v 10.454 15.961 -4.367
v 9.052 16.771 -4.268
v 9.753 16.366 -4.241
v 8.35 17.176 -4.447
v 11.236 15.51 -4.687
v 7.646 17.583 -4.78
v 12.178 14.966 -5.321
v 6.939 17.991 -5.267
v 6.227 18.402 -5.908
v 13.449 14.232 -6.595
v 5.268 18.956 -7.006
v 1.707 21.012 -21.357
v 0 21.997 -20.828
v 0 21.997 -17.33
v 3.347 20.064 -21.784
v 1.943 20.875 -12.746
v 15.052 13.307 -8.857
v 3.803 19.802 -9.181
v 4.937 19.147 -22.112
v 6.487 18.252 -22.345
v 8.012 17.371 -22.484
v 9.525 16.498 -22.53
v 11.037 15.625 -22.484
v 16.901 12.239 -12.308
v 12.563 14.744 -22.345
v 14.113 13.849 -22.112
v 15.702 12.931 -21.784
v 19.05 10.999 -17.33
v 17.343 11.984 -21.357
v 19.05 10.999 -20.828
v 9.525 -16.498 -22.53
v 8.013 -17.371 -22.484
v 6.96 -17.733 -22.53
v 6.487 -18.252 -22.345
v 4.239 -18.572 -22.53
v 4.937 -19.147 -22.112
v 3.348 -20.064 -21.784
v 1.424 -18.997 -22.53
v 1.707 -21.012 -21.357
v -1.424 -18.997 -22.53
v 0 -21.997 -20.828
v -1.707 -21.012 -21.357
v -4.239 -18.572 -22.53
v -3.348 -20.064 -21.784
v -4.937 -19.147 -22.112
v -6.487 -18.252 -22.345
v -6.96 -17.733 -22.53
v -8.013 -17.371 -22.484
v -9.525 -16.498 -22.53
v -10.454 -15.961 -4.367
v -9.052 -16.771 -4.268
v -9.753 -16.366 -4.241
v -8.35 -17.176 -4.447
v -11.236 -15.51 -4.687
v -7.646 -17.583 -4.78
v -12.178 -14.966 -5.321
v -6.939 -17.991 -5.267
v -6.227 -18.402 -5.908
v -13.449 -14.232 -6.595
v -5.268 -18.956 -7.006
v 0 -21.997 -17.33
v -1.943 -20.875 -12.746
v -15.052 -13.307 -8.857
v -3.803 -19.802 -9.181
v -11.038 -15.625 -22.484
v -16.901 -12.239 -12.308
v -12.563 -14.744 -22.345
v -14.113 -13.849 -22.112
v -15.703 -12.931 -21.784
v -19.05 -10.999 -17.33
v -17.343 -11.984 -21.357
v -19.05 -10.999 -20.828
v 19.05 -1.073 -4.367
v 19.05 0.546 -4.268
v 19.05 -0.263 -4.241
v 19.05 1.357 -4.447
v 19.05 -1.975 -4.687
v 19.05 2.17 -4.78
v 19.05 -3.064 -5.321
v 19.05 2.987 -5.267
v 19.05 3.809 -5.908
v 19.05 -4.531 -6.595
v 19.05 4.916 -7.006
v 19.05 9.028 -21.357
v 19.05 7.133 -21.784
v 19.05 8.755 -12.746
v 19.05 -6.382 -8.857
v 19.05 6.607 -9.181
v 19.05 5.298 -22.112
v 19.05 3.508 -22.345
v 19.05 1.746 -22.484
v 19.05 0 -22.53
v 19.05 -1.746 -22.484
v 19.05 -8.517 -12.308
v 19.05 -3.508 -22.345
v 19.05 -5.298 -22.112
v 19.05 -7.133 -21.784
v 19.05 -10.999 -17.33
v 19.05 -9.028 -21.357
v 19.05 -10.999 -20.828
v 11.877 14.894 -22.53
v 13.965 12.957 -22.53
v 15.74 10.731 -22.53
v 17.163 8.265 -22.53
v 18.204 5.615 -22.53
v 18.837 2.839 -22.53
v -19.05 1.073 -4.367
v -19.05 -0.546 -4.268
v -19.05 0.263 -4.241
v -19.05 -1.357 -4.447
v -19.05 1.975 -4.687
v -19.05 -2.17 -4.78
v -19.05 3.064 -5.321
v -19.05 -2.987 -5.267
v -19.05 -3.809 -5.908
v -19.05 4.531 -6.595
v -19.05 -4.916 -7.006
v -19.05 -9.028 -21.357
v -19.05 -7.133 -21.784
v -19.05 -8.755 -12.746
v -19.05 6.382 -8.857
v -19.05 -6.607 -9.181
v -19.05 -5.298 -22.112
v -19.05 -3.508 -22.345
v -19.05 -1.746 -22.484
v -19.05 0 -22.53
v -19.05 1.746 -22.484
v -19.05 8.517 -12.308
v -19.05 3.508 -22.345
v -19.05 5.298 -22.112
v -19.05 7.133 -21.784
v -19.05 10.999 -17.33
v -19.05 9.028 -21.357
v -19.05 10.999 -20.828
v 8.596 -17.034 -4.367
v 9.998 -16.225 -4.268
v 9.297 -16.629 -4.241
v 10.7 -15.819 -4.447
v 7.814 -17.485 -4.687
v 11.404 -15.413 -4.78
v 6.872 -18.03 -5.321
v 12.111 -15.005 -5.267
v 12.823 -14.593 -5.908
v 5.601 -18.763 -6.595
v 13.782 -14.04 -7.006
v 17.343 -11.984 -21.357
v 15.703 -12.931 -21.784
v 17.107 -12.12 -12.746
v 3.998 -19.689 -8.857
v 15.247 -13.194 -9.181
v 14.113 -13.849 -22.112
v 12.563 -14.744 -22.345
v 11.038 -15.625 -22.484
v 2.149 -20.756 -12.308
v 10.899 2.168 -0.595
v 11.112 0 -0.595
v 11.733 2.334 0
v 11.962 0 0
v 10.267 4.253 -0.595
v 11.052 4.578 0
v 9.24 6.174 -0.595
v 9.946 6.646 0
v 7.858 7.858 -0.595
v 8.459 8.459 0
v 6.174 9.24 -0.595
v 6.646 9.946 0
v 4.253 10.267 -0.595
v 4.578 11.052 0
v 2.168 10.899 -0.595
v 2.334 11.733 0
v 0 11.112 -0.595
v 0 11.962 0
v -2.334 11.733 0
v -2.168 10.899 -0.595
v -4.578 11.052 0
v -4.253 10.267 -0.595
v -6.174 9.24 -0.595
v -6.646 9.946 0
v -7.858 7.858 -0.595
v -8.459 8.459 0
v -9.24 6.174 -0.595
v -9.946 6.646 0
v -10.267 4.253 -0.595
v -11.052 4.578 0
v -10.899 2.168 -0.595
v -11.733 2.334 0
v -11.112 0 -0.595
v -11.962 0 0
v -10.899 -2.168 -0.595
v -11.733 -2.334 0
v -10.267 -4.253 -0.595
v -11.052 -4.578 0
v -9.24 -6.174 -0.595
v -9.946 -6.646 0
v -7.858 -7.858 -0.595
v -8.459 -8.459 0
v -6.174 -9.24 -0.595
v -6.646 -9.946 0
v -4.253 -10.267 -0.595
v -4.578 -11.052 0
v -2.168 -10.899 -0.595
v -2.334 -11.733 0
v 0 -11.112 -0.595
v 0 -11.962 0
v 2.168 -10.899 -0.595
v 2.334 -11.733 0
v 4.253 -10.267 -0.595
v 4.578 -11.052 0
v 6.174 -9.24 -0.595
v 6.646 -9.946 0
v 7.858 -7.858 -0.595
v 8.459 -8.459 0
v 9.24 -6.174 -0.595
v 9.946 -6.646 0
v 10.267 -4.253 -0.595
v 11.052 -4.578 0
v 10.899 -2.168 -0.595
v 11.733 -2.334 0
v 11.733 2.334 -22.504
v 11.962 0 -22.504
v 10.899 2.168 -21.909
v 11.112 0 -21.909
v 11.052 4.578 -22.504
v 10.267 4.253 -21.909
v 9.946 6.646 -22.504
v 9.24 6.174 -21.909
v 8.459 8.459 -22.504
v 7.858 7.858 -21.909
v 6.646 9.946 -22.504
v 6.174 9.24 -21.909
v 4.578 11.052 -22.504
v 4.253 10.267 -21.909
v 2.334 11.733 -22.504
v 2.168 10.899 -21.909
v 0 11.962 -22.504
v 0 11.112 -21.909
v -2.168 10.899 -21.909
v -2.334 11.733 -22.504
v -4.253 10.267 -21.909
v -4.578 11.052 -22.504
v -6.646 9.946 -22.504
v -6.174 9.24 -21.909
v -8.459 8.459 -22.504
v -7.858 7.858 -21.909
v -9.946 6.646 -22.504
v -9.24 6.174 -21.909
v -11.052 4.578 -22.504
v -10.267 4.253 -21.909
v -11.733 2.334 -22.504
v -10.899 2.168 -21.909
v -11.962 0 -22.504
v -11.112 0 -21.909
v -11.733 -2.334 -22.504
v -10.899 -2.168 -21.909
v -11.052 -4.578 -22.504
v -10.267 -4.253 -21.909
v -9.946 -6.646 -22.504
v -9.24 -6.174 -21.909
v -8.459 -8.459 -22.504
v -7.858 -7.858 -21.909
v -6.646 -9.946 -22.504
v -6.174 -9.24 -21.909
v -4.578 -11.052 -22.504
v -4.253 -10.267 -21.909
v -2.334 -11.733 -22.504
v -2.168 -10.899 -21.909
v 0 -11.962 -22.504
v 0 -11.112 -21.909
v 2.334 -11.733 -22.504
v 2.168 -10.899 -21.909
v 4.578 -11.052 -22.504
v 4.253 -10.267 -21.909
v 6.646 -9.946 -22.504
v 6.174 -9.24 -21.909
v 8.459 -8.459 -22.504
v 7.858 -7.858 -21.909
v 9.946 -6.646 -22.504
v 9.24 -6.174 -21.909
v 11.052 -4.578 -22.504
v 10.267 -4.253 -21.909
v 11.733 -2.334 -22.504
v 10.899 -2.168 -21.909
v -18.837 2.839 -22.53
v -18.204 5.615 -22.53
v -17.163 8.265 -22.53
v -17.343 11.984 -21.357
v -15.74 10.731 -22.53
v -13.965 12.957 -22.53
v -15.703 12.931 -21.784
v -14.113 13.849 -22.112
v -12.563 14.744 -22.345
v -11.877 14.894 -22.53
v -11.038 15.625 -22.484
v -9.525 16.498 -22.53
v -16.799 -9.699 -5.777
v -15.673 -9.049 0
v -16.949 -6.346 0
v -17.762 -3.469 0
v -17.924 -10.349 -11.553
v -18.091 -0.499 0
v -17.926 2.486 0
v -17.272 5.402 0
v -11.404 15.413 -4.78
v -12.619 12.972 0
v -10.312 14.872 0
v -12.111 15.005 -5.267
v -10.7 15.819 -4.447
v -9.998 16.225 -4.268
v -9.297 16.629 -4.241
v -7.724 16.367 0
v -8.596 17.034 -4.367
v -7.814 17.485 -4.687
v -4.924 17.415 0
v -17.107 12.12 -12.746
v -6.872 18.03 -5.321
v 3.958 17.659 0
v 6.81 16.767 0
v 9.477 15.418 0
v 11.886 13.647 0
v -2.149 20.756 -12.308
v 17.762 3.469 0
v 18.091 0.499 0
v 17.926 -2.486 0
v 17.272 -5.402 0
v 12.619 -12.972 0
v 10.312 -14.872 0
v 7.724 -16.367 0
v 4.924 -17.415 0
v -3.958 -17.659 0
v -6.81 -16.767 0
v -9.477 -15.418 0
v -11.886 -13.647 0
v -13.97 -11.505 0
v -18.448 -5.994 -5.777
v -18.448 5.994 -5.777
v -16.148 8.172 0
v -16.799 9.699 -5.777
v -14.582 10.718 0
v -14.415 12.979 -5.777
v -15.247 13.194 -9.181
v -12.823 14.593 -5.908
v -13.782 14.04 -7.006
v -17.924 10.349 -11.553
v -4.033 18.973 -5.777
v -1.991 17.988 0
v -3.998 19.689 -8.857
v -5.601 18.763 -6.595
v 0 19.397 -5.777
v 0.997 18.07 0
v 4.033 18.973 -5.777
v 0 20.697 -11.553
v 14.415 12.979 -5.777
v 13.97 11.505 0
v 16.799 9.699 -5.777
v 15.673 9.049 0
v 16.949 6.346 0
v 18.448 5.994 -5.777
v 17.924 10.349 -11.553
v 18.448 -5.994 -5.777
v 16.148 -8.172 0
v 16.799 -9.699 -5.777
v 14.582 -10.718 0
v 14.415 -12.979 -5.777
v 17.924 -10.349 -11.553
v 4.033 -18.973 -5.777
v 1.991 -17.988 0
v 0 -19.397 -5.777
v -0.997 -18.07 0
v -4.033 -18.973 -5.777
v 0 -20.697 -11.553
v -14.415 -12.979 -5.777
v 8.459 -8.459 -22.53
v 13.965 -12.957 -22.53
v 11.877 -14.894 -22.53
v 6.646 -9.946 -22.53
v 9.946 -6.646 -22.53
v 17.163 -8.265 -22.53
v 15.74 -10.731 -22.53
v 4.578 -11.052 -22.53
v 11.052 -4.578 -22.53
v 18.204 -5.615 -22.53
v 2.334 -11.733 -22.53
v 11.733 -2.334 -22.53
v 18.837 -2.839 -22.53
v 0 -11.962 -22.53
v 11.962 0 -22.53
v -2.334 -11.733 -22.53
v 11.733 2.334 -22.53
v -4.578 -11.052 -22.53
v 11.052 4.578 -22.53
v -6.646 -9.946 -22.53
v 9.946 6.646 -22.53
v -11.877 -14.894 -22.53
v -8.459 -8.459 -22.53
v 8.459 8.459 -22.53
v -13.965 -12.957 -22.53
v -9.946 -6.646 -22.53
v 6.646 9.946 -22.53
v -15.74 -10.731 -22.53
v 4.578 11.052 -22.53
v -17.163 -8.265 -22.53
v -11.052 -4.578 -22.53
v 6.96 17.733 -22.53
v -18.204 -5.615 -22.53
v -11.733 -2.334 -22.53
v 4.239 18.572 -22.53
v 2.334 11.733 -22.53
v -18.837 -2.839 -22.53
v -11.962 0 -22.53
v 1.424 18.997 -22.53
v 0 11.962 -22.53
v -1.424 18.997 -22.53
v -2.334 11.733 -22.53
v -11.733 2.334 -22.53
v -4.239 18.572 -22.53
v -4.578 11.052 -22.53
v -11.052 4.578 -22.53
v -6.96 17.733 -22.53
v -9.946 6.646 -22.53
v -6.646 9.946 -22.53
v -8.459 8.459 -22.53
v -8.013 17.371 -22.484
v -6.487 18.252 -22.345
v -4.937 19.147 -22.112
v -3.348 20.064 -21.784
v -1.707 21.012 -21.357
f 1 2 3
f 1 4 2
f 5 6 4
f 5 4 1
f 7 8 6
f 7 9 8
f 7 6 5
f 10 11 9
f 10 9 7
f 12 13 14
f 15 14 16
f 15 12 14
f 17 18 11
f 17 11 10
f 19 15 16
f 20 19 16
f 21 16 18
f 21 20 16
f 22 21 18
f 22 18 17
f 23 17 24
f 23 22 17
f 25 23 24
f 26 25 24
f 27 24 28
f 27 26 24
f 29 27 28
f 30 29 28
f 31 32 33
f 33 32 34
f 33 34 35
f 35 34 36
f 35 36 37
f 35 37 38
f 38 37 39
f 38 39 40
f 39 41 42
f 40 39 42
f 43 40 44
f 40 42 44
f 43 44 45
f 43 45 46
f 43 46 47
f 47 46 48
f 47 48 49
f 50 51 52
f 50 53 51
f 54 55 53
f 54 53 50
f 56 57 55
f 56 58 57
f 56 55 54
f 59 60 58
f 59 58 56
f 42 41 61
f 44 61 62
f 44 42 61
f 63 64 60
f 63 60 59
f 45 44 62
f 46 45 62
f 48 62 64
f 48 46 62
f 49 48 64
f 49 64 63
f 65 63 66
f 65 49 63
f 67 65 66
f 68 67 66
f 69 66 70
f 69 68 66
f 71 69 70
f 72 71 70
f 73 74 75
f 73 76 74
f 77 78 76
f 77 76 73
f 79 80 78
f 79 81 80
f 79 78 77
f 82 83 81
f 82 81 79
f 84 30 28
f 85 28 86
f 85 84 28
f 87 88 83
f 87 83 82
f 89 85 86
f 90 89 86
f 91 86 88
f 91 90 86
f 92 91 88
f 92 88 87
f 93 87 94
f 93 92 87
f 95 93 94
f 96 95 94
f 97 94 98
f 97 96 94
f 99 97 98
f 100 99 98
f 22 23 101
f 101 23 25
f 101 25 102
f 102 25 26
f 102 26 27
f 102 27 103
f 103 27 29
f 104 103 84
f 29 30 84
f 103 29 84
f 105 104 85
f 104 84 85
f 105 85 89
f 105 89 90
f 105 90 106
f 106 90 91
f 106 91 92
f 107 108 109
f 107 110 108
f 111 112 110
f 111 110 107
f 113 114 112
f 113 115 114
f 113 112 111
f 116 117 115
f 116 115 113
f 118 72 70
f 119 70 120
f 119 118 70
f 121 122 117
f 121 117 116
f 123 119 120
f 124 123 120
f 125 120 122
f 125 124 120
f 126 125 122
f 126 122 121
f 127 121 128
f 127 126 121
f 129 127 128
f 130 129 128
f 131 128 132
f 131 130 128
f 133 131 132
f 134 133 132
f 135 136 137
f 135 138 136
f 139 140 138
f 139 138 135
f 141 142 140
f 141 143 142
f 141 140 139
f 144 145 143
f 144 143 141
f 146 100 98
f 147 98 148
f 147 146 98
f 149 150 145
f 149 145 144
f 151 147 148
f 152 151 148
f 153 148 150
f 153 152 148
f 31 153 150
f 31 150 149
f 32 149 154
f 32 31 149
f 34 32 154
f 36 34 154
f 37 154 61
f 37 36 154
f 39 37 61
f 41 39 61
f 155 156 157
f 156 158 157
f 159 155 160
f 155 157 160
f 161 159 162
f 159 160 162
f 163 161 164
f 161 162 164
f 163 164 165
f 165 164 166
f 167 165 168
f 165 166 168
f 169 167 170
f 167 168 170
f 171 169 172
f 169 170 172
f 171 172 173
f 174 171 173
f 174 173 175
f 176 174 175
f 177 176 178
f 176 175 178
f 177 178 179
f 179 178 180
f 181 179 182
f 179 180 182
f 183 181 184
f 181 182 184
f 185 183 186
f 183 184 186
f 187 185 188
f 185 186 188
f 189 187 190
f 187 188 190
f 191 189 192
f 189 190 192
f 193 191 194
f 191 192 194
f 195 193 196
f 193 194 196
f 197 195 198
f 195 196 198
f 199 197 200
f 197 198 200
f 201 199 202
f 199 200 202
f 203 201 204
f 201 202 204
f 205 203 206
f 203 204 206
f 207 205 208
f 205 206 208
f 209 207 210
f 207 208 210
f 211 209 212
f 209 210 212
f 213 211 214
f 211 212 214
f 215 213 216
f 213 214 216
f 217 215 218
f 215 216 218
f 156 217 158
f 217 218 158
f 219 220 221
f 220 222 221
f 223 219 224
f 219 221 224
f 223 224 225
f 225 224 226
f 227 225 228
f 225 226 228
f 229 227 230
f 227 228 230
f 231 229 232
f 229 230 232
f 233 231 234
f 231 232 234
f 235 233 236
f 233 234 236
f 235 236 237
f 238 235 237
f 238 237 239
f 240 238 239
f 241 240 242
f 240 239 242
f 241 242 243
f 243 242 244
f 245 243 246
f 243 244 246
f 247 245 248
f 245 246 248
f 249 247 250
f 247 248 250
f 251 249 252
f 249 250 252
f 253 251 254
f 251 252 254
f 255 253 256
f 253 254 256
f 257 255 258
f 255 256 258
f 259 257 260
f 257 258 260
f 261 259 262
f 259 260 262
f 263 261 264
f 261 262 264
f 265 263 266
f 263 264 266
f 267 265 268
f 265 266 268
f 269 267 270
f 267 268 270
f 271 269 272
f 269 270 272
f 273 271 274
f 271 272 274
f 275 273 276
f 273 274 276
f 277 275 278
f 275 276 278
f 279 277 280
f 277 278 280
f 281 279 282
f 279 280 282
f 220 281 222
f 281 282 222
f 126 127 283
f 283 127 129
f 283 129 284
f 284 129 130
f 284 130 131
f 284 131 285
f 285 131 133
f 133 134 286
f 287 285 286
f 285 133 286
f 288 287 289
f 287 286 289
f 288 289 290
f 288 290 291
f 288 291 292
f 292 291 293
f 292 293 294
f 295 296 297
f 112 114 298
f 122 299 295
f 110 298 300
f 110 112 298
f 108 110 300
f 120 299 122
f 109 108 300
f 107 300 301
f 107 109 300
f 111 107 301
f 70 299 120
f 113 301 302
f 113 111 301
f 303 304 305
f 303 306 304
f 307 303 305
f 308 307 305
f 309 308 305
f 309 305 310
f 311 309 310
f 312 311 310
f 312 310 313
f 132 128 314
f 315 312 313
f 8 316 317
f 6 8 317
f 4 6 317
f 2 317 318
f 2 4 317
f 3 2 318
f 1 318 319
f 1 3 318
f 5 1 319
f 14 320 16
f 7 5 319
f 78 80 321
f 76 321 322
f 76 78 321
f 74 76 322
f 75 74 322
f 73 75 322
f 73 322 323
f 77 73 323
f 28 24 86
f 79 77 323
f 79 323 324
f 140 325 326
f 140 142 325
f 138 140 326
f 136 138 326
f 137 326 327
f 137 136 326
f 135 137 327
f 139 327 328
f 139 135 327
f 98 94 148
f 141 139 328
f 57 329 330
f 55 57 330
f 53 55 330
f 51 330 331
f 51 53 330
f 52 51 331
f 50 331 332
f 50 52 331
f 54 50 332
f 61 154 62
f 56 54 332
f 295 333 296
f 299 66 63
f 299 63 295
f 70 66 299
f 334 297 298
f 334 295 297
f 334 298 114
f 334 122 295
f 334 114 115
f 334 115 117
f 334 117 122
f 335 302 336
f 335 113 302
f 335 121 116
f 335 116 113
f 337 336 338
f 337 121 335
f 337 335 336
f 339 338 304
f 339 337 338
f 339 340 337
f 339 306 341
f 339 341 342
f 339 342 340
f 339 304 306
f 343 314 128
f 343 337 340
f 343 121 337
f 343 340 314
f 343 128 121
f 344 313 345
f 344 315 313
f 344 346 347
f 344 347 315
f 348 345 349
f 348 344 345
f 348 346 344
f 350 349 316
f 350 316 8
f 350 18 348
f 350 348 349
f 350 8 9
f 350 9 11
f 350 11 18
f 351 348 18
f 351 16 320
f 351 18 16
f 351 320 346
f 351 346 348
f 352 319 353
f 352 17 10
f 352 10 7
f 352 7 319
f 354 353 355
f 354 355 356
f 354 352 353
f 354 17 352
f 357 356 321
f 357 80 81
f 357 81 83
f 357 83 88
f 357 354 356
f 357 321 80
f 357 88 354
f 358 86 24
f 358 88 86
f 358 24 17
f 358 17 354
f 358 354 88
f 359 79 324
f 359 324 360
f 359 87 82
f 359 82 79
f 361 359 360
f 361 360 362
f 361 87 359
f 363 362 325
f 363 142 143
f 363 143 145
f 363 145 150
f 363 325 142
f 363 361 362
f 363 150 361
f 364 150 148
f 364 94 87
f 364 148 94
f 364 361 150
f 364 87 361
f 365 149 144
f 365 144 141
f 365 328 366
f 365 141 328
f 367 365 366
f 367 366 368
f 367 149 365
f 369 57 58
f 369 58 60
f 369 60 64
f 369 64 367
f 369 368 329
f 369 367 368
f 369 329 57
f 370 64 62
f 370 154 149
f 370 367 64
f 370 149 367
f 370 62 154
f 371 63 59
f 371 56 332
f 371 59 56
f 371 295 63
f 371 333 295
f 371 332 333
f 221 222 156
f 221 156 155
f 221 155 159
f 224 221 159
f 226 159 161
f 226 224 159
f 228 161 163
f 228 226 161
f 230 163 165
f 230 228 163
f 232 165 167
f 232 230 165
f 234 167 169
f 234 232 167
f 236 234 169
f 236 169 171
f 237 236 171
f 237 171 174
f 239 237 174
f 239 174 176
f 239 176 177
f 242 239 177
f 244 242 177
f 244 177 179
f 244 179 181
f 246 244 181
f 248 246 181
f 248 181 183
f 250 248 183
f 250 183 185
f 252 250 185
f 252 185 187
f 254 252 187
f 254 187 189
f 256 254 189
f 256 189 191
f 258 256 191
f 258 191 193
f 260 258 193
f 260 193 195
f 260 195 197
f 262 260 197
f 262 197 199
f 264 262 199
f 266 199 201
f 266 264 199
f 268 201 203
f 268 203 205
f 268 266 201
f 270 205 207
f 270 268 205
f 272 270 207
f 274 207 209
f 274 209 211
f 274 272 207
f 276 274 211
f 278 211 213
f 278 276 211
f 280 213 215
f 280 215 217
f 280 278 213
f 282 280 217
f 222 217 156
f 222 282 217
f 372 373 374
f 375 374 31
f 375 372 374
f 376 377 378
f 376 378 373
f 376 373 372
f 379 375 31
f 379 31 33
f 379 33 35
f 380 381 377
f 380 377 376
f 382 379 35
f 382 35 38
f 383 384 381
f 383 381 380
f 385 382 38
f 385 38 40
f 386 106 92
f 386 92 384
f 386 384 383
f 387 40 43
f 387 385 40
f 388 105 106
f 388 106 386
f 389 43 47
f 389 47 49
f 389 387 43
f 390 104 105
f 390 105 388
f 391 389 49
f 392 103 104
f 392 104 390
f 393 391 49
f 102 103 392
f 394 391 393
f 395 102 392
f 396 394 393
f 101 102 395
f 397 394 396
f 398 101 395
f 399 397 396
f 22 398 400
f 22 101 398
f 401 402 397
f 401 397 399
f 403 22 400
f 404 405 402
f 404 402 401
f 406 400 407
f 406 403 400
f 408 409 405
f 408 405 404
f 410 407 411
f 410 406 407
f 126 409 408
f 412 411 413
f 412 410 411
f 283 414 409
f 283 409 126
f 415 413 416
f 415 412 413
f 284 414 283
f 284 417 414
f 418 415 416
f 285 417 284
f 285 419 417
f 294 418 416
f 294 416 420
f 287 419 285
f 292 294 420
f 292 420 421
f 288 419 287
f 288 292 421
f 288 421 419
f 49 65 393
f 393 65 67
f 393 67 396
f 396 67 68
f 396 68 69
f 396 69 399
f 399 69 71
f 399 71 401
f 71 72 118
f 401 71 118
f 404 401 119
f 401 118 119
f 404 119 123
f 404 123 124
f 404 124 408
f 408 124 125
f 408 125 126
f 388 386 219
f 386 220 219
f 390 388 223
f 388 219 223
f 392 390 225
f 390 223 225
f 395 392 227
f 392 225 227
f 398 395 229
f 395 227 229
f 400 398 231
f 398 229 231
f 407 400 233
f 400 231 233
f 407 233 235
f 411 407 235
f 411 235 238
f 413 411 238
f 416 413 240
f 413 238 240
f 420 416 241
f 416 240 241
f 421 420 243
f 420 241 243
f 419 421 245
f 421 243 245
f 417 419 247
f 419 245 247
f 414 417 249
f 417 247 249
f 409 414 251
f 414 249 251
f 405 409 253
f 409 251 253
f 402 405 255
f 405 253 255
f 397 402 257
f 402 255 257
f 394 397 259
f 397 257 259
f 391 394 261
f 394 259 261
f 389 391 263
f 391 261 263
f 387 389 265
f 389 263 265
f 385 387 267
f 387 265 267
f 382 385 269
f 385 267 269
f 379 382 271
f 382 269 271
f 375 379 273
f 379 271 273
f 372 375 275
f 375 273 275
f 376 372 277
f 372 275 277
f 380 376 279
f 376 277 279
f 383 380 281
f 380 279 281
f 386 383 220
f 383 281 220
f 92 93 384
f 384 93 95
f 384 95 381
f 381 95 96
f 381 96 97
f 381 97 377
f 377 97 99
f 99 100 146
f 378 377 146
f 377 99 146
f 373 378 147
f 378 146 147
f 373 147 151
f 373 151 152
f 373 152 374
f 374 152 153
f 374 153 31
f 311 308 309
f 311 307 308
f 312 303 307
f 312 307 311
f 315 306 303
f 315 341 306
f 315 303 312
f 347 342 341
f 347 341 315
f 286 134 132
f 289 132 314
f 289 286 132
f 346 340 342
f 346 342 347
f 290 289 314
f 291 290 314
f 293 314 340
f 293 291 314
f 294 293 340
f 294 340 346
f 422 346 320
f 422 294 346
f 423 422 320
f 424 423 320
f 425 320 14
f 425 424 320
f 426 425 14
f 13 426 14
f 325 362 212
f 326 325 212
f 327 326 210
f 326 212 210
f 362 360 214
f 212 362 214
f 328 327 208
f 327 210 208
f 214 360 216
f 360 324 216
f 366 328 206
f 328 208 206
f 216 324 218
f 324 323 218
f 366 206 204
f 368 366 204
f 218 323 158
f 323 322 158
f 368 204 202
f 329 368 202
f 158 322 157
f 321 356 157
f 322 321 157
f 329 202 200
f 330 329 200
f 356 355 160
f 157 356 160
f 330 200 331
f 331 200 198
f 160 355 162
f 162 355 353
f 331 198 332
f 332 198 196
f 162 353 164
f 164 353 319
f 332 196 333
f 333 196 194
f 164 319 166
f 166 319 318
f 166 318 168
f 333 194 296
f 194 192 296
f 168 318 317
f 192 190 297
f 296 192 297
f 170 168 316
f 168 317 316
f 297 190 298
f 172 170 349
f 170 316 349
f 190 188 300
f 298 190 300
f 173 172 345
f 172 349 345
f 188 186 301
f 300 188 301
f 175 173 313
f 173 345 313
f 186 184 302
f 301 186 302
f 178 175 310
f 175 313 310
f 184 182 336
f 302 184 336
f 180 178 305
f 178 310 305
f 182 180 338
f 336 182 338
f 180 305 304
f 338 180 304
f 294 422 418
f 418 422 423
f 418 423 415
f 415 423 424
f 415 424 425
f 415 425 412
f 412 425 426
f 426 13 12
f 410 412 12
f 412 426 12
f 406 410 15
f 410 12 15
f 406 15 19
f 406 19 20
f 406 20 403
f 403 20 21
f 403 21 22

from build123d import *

# Parameters (mm, degrees)
BASENUT_START = -22.5298
BASENUTSKE_R  = 11.1125
BASENUT_DEPTH = 22.5298


# Read off the part's stored shape, not the designer's step: ThreadSchematic
with BuildPart() as part:
    # BaseNutSke → BaseNut (new body)
    with BuildSketch(Plane.XY.offset(BASENUT_START)):
        Polygon((19.05, 10.998522628), (19.05, -10.998522628), (0, -21.997045256), (-19.05, -10.998522628), (-19.05, 10.998522628), (0, 21.997045256), align=None)
        Circle(BASENUTSKE_R, mode=Mode.SUBTRACT)
    extrude(amount=BASENUT_DEPTH)

    # Sketch5 (on Top Plane) → EndChamfer (revolve, cut)
    with BuildSketch(Plane(origin=(0, 0, 0), x_dir=(1, 0, 0), z_dir=(0, 1, 0))):
        Polygon((22.5044, 11.9625), (21.849705952, 11.0275), (22.5552, 11.0275), (22.5552, 11.9625), align=None)
        Polygon((-0.0508, 11.9625), (0, 11.9625), (0.654694048, 11.0275), (-0.0508, 11.0275), align=None)
    revolve(axis=Axis((0, 0, -11.9625), (0.5735764363510524, 0, 0.8191520442889872)), mode=Mode.SUBTRACT)

    # Sketch3 → Double-Chamfer (revolve, cut)
    with BuildSketch(Plane(origin=(0, 0, 0), x_dir=(0, 0, -1), z_dir=(1, 0, 0)), mode=Mode.PRIVATE) as double_chamfer_sk:
        Polygon((22.5298, 19.05), (20.828322628, 21.997045256), (20.828322628, 31.997045256), (32.5298, 31.997045256), (32.5298, 19.05), align=None)
        Polygon((17.330027328, 31.997045256), (-10, 31.997045256), (-10, 18.0975), (0, 18.0975), (17.330027328, 21.997045256), align=None)
    revolve(double_chamfer_sk.sketch.rotate(Axis((0, 0, 0), (0, 0, -1)), 240.000000311), axis=Axis((0, 0, 0), (0, 0, -1)), mode=Mode.SUBTRACT)

    # ThreadSchematic outline → ThreadSchematic (revolve, cut)
    with BuildSketch(Plane.XZ):
        Polygon((11.1125, 0), (11.1125, -0.595176407), (11.9625, 0), align=None)
        Polygon((11.9625, -22.5044), (11.1125, -21.909223593), (11.1125, -22.5298), (11.9625, -22.5298), align=None)
    revolve(axis=Axis((0, 0, 0), (0, 0, 1)), mode=Mode.SUBTRACT)


solid = part.part
